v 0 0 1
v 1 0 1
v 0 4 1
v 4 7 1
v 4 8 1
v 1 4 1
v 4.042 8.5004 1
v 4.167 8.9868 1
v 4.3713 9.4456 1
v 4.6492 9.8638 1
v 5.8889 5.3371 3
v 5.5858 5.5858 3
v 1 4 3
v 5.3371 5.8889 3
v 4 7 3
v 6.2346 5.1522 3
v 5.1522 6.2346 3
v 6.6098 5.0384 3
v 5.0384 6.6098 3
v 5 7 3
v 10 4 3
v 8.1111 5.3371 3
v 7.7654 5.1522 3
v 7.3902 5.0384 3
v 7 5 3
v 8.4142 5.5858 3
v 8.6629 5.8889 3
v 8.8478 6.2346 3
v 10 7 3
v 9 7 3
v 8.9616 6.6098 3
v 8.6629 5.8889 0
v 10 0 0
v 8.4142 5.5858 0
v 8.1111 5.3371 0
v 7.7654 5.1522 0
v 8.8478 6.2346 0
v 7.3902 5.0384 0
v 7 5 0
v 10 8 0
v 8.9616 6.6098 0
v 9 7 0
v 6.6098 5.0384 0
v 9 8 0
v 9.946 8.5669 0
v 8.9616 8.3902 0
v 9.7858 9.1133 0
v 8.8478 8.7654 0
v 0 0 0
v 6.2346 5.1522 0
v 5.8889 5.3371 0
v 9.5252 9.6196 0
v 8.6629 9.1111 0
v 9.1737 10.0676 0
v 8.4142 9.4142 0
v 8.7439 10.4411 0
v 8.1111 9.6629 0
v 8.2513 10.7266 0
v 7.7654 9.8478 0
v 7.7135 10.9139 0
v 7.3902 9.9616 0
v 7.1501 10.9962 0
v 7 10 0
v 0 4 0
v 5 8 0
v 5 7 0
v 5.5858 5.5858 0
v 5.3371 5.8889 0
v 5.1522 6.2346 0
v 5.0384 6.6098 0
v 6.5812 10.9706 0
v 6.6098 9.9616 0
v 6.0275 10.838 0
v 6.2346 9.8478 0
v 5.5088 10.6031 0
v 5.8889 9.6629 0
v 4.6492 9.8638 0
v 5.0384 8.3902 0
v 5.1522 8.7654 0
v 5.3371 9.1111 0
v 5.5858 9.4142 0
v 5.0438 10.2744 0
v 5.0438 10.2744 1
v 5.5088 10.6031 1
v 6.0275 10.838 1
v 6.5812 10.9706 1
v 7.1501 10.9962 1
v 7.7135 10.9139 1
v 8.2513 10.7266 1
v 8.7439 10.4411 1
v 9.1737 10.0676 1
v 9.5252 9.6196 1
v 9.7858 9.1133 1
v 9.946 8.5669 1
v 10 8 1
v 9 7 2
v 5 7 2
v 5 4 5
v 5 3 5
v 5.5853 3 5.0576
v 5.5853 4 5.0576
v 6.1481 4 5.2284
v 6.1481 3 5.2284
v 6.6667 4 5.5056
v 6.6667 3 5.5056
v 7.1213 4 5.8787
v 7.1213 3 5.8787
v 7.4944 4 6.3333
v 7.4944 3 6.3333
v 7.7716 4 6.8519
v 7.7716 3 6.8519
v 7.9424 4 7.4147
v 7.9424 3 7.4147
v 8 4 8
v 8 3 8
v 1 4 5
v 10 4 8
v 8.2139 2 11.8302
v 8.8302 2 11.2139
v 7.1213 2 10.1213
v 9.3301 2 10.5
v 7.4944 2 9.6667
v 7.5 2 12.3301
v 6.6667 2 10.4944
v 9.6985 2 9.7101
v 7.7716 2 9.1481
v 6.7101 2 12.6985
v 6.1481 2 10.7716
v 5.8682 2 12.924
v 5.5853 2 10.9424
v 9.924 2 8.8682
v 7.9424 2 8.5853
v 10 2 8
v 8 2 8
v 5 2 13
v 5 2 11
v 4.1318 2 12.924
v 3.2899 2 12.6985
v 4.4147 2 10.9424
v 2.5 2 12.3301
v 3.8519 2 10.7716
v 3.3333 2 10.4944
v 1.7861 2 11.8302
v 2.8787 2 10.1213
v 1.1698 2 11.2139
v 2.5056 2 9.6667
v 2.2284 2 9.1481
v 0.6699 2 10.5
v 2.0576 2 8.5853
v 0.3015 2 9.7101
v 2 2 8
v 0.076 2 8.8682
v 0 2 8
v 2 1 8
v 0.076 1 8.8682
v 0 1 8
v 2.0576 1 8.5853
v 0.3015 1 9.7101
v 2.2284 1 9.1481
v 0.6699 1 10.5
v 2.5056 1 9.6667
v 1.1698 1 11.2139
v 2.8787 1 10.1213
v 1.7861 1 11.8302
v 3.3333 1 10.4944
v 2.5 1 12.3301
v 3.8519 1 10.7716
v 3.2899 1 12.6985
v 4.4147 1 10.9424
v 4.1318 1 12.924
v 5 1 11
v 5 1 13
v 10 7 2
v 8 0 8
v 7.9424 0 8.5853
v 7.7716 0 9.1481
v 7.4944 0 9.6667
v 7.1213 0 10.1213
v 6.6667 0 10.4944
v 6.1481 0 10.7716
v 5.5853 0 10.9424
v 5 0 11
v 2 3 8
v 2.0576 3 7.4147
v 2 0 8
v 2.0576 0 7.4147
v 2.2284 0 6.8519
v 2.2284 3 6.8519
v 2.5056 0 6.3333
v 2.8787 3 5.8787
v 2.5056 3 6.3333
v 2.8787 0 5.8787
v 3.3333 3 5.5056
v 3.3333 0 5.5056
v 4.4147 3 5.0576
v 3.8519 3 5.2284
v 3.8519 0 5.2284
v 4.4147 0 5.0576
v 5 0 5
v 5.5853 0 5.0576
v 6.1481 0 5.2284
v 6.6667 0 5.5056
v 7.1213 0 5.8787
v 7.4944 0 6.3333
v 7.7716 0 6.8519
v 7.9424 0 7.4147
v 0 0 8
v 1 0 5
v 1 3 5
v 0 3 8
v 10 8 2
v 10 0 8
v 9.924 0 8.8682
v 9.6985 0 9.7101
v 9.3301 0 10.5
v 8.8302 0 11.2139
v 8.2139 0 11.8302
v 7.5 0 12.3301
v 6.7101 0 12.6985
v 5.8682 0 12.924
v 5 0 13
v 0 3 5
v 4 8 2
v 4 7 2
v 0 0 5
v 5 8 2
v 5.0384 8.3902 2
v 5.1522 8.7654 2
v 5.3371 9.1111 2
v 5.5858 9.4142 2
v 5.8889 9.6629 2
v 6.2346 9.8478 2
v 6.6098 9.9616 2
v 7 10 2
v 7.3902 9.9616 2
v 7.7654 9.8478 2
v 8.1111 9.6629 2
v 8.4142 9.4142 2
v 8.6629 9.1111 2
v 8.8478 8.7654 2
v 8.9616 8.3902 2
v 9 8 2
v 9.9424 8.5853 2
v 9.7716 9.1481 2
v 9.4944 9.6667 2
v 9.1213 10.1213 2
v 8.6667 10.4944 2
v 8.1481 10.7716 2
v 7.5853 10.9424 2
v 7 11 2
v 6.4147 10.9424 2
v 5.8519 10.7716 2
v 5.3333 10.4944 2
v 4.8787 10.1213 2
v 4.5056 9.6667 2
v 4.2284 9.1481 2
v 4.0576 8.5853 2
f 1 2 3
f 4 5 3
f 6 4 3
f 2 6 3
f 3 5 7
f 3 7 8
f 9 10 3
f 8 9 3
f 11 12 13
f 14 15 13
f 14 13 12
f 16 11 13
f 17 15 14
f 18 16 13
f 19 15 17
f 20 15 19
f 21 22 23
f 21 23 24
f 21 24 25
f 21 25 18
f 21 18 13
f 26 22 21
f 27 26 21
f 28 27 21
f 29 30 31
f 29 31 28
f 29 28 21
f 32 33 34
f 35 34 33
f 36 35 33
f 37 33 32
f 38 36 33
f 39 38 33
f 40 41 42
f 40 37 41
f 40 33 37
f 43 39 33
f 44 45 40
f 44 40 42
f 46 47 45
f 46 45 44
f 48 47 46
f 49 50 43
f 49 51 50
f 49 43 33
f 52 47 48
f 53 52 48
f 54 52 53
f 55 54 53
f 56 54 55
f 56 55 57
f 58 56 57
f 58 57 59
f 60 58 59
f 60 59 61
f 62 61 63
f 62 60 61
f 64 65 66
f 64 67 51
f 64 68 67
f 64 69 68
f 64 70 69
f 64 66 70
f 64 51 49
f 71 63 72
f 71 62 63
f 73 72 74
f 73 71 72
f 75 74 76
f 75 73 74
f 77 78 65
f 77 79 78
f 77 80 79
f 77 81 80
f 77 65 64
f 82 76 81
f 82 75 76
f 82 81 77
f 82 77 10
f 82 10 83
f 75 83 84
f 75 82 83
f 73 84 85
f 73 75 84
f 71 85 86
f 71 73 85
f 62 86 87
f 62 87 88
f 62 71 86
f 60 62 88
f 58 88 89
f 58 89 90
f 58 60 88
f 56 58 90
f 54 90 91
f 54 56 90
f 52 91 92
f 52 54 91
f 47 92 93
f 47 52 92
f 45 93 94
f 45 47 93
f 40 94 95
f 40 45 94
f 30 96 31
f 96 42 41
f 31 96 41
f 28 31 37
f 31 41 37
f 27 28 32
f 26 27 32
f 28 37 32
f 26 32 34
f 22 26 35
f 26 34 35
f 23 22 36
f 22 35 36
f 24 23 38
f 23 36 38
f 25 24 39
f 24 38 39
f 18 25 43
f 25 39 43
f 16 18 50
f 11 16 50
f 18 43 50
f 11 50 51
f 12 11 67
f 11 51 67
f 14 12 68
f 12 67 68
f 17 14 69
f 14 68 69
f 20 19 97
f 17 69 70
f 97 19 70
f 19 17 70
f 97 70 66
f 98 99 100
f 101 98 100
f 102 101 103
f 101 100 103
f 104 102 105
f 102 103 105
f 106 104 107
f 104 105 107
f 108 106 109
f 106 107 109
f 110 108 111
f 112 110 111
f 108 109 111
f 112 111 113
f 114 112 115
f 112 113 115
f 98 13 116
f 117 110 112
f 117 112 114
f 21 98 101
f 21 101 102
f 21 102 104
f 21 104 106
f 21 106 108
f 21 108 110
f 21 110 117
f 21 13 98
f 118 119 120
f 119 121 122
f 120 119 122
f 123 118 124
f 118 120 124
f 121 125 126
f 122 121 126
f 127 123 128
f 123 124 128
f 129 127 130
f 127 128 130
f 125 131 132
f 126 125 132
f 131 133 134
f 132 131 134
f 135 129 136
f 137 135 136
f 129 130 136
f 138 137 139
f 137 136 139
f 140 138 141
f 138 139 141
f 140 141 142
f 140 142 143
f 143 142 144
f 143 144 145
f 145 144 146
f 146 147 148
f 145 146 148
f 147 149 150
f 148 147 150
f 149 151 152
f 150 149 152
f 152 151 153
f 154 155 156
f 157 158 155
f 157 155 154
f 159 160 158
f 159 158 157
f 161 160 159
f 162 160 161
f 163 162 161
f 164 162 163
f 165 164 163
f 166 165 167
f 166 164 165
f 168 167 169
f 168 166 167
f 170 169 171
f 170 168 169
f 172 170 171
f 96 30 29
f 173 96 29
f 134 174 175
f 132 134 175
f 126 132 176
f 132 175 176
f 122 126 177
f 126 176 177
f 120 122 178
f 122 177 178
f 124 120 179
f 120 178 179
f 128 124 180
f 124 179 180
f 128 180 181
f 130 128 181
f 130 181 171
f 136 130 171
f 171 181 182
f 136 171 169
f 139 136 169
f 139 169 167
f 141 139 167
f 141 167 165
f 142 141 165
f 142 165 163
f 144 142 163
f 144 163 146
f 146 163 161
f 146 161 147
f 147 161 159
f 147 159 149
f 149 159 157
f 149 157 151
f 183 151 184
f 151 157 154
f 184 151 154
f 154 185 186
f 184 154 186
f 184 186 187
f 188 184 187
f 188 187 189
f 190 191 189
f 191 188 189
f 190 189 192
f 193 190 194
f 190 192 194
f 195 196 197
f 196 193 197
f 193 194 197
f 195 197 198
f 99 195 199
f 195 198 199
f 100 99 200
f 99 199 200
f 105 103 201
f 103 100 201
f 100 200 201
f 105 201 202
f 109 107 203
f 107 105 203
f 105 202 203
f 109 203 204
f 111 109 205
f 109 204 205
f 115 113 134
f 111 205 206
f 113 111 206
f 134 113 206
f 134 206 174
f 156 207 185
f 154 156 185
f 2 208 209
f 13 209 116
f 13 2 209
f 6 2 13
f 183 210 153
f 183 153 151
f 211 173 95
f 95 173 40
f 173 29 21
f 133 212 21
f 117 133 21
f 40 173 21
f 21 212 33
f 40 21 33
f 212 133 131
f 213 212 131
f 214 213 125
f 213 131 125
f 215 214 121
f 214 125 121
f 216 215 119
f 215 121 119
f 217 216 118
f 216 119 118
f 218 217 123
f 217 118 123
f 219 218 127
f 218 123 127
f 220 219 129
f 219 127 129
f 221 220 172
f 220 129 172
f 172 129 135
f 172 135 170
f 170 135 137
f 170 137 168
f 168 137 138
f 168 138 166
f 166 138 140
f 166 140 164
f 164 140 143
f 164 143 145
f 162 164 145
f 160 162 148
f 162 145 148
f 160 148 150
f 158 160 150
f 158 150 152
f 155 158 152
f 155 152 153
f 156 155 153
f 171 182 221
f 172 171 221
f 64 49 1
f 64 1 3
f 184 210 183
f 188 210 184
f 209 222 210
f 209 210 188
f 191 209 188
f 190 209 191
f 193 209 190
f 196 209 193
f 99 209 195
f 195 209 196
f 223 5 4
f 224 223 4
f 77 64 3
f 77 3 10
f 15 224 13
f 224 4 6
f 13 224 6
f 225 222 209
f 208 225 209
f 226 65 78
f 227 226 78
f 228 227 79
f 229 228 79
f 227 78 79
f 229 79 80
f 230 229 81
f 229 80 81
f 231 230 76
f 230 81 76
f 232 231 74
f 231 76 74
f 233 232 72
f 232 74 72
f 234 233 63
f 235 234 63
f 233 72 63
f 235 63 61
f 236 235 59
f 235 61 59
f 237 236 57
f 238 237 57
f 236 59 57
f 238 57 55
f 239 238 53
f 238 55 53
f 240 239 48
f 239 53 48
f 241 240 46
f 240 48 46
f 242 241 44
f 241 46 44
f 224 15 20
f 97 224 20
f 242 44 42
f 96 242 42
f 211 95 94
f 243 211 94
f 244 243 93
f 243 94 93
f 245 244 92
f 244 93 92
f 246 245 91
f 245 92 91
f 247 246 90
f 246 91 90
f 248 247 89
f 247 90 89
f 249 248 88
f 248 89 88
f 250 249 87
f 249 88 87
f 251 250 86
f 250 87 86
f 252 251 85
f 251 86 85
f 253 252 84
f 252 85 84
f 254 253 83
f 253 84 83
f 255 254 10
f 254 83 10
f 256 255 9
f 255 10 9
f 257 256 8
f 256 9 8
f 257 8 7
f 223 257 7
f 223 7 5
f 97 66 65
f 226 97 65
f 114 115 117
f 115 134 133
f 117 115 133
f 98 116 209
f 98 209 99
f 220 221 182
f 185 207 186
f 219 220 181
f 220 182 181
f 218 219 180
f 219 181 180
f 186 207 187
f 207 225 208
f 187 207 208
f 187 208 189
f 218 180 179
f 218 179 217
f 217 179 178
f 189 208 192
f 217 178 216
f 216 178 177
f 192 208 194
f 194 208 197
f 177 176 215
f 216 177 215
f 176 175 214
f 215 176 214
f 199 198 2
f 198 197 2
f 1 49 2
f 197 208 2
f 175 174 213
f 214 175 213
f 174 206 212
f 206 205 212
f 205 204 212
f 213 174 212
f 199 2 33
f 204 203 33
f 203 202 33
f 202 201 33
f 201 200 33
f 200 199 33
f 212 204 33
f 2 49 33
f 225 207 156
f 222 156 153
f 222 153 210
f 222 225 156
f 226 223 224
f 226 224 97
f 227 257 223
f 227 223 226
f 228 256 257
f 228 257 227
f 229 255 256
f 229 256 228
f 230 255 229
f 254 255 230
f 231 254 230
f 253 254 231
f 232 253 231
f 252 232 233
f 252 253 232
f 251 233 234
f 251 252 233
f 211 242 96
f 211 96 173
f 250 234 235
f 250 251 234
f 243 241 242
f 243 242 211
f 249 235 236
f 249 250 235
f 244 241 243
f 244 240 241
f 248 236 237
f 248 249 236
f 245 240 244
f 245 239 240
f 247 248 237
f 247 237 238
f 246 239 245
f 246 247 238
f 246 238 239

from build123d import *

# Parameters (mm, degrees)
BOSS_EXTRUDE1_DEPTH = 1
BOSS_EXTRUDE3_DEPTH = 2
SKETCH5_W           = 6.323405325
SKETCH5_H           = 4.405706714
CUT_EXTRUDE2_DEPTH  = 1
SKETCH6_W           = 9
SKETCH6_H           = 4
BOSS_EXTRUDE4_DEPTH = 2
SKETCH7_W           = 10
SKETCH7_H           = 3
BOSS_EXTRUDE5_DEPTH = 8
SKETCH8_R           = 3
CUT_EXTRUDE3_DEPTH  = 8
CUT_EXTRUDE4_DEPTH  = 1
CUT_EXTRUDE5_DEPTH  = 1
BOSS_EXTRUDE6_DEPTH = 1


with BuildPart() as part:
    # Sketch2 → Boss-Extrude1 (new body)
    with BuildSketch(Plane.XY):
        with BuildLine():
            Line((0, 0), (0, 4))
            Line((0, 4), (4.649234196, 9.863840158))
            ThreePointArc((4.649234196, 9.863840158), (7.986839041, 10.833045836), (10, 8))
            Line((10, 8), (10, 0))
            Line((10, 0), (0, 0))
        make_face()
        with BuildLine():
            Line((9, 8), (9, 7))
            ThreePointArc((9, 7), (7, 5), (5, 7))
            Line((5, 7), (5, 8))
            ThreePointArc((5, 8), (7, 10), (9, 8))
        make_face(mode=Mode.SUBTRACT)
    extrude(amount=BOSS_EXTRUDE1_DEPTH)

    # Sketch3 → Boss-Extrude3 (add)
    with BuildSketch(Plane.XY.offset(1)):
        with BuildLine():
            Line((1, 4), (1, 0))
            Line((1, 0), (10, 0))
            Line((10, 0), (10, 8))
            ThreePointArc((10, 8), (7, 11), (4, 8))
            Line((4, 8), (4, 7))
            Line((4, 7), (1, 4))
        make_face()
        with BuildLine():
            Line((5, 7), (5, 8))
            ThreePointArc((5, 8), (7, 10), (9, 8))
            Line((9, 8), (9, 7))
            ThreePointArc((9, 7), (7, 5), (5, 7))
        make_face(mode=Mode.SUBTRACT)
    extrude(amount=BOSS_EXTRUDE3_DEPTH)

    # Sketch5 → Cut-Extrude2 (cut)
    with BuildSketch(Plane.XY.offset(3)):
        with Locations((7.161702663, 9.202853357)):
            Rectangle(SKETCH5_W, SKETCH5_H)
    extrude(amount=-CUT_EXTRUDE2_DEPTH, mode=Mode.SUBTRACT)

    # Sketch6 → Boss-Extrude4 (add)
    with BuildSketch(Plane.XY.offset(3)):
        with Locations((5.5, 2)):
            Rectangle(SKETCH6_W, SKETCH6_H)
    extrude(amount=BOSS_EXTRUDE4_DEPTH)

    # Sketch7 → Boss-Extrude5 (add)
    with BuildSketch(Plane.XY.offset(5)):
        with Locations((5, 1.5)):
            Rectangle(SKETCH7_W, SKETCH7_H)
    extrude(amount=BOSS_EXTRUDE5_DEPTH)

    # Sketch8 → Cut-Extrude3 (cut)
    with BuildSketch(Plane(origin=(0, 4, 0), x_dir=(1, 0, 0), z_dir=(0, 1, 0))):
        with BuildLine():
            Line((10, -16.316770955), (10, -8))
            ThreePointArc((10, -8), (5, -13), (0, -8))
            Line((0, -8), (0, -16.316770955))
            Line((0, -16.316770955), (10, -16.316770955))
        make_face()
        with Locations((5, -8)):
            Circle(SKETCH8_R)
    extrude(amount=-CUT_EXTRUDE3_DEPTH, mode=Mode.SUBTRACT)

    # Sketch9 → Cut-Extrude4 (cut)
    with BuildSketch(Plane.XZ):
        with BuildLine():
            Line((5, 11), (5, 13))
            ThreePointArc((5, 13), (1.464466094, 11.535533906), (0, 8))
            Line((0, 8), (2, 8))
            ThreePointArc((2, 8), (2.878679656, 10.121320344), (5, 11))
        make_face()
    extrude(amount=-CUT_EXTRUDE4_DEPTH, mode=Mode.SUBTRACT)

    # Sketch10 → Cut-Extrude5 (cut)
    with BuildSketch(Plane(origin=(0, 3, 0), x_dir=(1, 0, 0), z_dir=(0, 1, 0))):
        with BuildLine():
            Line((0, -8), (2, -8))
            ThreePointArc((2, -8), (5, -11), (8, -8))
            Line((8, -8), (10, -8))
            ThreePointArc((10, -8), (5, -13), (0, -8))
        make_face()
    extrude(amount=-CUT_EXTRUDE5_DEPTH, mode=Mode.SUBTRACT)

    # Sketch11 → Boss-Extrude6 (add)
    with BuildSketch(Plane(origin=(0, 3, 0), x_dir=(1, 0, 0), z_dir=(0, 1, 0))):
        with BuildLine():
            Line((8, -8), (10, -8))
            Line((10, -8), (10, -5))
            Line((10, -5), (5, -5))
            ThreePointArc((5, -5), (7.121320344, -5.878679656), (8, -8))
        make_face()
    extrude(amount=BOSS_EXTRUDE6_DEPTH)


solid = part.part
